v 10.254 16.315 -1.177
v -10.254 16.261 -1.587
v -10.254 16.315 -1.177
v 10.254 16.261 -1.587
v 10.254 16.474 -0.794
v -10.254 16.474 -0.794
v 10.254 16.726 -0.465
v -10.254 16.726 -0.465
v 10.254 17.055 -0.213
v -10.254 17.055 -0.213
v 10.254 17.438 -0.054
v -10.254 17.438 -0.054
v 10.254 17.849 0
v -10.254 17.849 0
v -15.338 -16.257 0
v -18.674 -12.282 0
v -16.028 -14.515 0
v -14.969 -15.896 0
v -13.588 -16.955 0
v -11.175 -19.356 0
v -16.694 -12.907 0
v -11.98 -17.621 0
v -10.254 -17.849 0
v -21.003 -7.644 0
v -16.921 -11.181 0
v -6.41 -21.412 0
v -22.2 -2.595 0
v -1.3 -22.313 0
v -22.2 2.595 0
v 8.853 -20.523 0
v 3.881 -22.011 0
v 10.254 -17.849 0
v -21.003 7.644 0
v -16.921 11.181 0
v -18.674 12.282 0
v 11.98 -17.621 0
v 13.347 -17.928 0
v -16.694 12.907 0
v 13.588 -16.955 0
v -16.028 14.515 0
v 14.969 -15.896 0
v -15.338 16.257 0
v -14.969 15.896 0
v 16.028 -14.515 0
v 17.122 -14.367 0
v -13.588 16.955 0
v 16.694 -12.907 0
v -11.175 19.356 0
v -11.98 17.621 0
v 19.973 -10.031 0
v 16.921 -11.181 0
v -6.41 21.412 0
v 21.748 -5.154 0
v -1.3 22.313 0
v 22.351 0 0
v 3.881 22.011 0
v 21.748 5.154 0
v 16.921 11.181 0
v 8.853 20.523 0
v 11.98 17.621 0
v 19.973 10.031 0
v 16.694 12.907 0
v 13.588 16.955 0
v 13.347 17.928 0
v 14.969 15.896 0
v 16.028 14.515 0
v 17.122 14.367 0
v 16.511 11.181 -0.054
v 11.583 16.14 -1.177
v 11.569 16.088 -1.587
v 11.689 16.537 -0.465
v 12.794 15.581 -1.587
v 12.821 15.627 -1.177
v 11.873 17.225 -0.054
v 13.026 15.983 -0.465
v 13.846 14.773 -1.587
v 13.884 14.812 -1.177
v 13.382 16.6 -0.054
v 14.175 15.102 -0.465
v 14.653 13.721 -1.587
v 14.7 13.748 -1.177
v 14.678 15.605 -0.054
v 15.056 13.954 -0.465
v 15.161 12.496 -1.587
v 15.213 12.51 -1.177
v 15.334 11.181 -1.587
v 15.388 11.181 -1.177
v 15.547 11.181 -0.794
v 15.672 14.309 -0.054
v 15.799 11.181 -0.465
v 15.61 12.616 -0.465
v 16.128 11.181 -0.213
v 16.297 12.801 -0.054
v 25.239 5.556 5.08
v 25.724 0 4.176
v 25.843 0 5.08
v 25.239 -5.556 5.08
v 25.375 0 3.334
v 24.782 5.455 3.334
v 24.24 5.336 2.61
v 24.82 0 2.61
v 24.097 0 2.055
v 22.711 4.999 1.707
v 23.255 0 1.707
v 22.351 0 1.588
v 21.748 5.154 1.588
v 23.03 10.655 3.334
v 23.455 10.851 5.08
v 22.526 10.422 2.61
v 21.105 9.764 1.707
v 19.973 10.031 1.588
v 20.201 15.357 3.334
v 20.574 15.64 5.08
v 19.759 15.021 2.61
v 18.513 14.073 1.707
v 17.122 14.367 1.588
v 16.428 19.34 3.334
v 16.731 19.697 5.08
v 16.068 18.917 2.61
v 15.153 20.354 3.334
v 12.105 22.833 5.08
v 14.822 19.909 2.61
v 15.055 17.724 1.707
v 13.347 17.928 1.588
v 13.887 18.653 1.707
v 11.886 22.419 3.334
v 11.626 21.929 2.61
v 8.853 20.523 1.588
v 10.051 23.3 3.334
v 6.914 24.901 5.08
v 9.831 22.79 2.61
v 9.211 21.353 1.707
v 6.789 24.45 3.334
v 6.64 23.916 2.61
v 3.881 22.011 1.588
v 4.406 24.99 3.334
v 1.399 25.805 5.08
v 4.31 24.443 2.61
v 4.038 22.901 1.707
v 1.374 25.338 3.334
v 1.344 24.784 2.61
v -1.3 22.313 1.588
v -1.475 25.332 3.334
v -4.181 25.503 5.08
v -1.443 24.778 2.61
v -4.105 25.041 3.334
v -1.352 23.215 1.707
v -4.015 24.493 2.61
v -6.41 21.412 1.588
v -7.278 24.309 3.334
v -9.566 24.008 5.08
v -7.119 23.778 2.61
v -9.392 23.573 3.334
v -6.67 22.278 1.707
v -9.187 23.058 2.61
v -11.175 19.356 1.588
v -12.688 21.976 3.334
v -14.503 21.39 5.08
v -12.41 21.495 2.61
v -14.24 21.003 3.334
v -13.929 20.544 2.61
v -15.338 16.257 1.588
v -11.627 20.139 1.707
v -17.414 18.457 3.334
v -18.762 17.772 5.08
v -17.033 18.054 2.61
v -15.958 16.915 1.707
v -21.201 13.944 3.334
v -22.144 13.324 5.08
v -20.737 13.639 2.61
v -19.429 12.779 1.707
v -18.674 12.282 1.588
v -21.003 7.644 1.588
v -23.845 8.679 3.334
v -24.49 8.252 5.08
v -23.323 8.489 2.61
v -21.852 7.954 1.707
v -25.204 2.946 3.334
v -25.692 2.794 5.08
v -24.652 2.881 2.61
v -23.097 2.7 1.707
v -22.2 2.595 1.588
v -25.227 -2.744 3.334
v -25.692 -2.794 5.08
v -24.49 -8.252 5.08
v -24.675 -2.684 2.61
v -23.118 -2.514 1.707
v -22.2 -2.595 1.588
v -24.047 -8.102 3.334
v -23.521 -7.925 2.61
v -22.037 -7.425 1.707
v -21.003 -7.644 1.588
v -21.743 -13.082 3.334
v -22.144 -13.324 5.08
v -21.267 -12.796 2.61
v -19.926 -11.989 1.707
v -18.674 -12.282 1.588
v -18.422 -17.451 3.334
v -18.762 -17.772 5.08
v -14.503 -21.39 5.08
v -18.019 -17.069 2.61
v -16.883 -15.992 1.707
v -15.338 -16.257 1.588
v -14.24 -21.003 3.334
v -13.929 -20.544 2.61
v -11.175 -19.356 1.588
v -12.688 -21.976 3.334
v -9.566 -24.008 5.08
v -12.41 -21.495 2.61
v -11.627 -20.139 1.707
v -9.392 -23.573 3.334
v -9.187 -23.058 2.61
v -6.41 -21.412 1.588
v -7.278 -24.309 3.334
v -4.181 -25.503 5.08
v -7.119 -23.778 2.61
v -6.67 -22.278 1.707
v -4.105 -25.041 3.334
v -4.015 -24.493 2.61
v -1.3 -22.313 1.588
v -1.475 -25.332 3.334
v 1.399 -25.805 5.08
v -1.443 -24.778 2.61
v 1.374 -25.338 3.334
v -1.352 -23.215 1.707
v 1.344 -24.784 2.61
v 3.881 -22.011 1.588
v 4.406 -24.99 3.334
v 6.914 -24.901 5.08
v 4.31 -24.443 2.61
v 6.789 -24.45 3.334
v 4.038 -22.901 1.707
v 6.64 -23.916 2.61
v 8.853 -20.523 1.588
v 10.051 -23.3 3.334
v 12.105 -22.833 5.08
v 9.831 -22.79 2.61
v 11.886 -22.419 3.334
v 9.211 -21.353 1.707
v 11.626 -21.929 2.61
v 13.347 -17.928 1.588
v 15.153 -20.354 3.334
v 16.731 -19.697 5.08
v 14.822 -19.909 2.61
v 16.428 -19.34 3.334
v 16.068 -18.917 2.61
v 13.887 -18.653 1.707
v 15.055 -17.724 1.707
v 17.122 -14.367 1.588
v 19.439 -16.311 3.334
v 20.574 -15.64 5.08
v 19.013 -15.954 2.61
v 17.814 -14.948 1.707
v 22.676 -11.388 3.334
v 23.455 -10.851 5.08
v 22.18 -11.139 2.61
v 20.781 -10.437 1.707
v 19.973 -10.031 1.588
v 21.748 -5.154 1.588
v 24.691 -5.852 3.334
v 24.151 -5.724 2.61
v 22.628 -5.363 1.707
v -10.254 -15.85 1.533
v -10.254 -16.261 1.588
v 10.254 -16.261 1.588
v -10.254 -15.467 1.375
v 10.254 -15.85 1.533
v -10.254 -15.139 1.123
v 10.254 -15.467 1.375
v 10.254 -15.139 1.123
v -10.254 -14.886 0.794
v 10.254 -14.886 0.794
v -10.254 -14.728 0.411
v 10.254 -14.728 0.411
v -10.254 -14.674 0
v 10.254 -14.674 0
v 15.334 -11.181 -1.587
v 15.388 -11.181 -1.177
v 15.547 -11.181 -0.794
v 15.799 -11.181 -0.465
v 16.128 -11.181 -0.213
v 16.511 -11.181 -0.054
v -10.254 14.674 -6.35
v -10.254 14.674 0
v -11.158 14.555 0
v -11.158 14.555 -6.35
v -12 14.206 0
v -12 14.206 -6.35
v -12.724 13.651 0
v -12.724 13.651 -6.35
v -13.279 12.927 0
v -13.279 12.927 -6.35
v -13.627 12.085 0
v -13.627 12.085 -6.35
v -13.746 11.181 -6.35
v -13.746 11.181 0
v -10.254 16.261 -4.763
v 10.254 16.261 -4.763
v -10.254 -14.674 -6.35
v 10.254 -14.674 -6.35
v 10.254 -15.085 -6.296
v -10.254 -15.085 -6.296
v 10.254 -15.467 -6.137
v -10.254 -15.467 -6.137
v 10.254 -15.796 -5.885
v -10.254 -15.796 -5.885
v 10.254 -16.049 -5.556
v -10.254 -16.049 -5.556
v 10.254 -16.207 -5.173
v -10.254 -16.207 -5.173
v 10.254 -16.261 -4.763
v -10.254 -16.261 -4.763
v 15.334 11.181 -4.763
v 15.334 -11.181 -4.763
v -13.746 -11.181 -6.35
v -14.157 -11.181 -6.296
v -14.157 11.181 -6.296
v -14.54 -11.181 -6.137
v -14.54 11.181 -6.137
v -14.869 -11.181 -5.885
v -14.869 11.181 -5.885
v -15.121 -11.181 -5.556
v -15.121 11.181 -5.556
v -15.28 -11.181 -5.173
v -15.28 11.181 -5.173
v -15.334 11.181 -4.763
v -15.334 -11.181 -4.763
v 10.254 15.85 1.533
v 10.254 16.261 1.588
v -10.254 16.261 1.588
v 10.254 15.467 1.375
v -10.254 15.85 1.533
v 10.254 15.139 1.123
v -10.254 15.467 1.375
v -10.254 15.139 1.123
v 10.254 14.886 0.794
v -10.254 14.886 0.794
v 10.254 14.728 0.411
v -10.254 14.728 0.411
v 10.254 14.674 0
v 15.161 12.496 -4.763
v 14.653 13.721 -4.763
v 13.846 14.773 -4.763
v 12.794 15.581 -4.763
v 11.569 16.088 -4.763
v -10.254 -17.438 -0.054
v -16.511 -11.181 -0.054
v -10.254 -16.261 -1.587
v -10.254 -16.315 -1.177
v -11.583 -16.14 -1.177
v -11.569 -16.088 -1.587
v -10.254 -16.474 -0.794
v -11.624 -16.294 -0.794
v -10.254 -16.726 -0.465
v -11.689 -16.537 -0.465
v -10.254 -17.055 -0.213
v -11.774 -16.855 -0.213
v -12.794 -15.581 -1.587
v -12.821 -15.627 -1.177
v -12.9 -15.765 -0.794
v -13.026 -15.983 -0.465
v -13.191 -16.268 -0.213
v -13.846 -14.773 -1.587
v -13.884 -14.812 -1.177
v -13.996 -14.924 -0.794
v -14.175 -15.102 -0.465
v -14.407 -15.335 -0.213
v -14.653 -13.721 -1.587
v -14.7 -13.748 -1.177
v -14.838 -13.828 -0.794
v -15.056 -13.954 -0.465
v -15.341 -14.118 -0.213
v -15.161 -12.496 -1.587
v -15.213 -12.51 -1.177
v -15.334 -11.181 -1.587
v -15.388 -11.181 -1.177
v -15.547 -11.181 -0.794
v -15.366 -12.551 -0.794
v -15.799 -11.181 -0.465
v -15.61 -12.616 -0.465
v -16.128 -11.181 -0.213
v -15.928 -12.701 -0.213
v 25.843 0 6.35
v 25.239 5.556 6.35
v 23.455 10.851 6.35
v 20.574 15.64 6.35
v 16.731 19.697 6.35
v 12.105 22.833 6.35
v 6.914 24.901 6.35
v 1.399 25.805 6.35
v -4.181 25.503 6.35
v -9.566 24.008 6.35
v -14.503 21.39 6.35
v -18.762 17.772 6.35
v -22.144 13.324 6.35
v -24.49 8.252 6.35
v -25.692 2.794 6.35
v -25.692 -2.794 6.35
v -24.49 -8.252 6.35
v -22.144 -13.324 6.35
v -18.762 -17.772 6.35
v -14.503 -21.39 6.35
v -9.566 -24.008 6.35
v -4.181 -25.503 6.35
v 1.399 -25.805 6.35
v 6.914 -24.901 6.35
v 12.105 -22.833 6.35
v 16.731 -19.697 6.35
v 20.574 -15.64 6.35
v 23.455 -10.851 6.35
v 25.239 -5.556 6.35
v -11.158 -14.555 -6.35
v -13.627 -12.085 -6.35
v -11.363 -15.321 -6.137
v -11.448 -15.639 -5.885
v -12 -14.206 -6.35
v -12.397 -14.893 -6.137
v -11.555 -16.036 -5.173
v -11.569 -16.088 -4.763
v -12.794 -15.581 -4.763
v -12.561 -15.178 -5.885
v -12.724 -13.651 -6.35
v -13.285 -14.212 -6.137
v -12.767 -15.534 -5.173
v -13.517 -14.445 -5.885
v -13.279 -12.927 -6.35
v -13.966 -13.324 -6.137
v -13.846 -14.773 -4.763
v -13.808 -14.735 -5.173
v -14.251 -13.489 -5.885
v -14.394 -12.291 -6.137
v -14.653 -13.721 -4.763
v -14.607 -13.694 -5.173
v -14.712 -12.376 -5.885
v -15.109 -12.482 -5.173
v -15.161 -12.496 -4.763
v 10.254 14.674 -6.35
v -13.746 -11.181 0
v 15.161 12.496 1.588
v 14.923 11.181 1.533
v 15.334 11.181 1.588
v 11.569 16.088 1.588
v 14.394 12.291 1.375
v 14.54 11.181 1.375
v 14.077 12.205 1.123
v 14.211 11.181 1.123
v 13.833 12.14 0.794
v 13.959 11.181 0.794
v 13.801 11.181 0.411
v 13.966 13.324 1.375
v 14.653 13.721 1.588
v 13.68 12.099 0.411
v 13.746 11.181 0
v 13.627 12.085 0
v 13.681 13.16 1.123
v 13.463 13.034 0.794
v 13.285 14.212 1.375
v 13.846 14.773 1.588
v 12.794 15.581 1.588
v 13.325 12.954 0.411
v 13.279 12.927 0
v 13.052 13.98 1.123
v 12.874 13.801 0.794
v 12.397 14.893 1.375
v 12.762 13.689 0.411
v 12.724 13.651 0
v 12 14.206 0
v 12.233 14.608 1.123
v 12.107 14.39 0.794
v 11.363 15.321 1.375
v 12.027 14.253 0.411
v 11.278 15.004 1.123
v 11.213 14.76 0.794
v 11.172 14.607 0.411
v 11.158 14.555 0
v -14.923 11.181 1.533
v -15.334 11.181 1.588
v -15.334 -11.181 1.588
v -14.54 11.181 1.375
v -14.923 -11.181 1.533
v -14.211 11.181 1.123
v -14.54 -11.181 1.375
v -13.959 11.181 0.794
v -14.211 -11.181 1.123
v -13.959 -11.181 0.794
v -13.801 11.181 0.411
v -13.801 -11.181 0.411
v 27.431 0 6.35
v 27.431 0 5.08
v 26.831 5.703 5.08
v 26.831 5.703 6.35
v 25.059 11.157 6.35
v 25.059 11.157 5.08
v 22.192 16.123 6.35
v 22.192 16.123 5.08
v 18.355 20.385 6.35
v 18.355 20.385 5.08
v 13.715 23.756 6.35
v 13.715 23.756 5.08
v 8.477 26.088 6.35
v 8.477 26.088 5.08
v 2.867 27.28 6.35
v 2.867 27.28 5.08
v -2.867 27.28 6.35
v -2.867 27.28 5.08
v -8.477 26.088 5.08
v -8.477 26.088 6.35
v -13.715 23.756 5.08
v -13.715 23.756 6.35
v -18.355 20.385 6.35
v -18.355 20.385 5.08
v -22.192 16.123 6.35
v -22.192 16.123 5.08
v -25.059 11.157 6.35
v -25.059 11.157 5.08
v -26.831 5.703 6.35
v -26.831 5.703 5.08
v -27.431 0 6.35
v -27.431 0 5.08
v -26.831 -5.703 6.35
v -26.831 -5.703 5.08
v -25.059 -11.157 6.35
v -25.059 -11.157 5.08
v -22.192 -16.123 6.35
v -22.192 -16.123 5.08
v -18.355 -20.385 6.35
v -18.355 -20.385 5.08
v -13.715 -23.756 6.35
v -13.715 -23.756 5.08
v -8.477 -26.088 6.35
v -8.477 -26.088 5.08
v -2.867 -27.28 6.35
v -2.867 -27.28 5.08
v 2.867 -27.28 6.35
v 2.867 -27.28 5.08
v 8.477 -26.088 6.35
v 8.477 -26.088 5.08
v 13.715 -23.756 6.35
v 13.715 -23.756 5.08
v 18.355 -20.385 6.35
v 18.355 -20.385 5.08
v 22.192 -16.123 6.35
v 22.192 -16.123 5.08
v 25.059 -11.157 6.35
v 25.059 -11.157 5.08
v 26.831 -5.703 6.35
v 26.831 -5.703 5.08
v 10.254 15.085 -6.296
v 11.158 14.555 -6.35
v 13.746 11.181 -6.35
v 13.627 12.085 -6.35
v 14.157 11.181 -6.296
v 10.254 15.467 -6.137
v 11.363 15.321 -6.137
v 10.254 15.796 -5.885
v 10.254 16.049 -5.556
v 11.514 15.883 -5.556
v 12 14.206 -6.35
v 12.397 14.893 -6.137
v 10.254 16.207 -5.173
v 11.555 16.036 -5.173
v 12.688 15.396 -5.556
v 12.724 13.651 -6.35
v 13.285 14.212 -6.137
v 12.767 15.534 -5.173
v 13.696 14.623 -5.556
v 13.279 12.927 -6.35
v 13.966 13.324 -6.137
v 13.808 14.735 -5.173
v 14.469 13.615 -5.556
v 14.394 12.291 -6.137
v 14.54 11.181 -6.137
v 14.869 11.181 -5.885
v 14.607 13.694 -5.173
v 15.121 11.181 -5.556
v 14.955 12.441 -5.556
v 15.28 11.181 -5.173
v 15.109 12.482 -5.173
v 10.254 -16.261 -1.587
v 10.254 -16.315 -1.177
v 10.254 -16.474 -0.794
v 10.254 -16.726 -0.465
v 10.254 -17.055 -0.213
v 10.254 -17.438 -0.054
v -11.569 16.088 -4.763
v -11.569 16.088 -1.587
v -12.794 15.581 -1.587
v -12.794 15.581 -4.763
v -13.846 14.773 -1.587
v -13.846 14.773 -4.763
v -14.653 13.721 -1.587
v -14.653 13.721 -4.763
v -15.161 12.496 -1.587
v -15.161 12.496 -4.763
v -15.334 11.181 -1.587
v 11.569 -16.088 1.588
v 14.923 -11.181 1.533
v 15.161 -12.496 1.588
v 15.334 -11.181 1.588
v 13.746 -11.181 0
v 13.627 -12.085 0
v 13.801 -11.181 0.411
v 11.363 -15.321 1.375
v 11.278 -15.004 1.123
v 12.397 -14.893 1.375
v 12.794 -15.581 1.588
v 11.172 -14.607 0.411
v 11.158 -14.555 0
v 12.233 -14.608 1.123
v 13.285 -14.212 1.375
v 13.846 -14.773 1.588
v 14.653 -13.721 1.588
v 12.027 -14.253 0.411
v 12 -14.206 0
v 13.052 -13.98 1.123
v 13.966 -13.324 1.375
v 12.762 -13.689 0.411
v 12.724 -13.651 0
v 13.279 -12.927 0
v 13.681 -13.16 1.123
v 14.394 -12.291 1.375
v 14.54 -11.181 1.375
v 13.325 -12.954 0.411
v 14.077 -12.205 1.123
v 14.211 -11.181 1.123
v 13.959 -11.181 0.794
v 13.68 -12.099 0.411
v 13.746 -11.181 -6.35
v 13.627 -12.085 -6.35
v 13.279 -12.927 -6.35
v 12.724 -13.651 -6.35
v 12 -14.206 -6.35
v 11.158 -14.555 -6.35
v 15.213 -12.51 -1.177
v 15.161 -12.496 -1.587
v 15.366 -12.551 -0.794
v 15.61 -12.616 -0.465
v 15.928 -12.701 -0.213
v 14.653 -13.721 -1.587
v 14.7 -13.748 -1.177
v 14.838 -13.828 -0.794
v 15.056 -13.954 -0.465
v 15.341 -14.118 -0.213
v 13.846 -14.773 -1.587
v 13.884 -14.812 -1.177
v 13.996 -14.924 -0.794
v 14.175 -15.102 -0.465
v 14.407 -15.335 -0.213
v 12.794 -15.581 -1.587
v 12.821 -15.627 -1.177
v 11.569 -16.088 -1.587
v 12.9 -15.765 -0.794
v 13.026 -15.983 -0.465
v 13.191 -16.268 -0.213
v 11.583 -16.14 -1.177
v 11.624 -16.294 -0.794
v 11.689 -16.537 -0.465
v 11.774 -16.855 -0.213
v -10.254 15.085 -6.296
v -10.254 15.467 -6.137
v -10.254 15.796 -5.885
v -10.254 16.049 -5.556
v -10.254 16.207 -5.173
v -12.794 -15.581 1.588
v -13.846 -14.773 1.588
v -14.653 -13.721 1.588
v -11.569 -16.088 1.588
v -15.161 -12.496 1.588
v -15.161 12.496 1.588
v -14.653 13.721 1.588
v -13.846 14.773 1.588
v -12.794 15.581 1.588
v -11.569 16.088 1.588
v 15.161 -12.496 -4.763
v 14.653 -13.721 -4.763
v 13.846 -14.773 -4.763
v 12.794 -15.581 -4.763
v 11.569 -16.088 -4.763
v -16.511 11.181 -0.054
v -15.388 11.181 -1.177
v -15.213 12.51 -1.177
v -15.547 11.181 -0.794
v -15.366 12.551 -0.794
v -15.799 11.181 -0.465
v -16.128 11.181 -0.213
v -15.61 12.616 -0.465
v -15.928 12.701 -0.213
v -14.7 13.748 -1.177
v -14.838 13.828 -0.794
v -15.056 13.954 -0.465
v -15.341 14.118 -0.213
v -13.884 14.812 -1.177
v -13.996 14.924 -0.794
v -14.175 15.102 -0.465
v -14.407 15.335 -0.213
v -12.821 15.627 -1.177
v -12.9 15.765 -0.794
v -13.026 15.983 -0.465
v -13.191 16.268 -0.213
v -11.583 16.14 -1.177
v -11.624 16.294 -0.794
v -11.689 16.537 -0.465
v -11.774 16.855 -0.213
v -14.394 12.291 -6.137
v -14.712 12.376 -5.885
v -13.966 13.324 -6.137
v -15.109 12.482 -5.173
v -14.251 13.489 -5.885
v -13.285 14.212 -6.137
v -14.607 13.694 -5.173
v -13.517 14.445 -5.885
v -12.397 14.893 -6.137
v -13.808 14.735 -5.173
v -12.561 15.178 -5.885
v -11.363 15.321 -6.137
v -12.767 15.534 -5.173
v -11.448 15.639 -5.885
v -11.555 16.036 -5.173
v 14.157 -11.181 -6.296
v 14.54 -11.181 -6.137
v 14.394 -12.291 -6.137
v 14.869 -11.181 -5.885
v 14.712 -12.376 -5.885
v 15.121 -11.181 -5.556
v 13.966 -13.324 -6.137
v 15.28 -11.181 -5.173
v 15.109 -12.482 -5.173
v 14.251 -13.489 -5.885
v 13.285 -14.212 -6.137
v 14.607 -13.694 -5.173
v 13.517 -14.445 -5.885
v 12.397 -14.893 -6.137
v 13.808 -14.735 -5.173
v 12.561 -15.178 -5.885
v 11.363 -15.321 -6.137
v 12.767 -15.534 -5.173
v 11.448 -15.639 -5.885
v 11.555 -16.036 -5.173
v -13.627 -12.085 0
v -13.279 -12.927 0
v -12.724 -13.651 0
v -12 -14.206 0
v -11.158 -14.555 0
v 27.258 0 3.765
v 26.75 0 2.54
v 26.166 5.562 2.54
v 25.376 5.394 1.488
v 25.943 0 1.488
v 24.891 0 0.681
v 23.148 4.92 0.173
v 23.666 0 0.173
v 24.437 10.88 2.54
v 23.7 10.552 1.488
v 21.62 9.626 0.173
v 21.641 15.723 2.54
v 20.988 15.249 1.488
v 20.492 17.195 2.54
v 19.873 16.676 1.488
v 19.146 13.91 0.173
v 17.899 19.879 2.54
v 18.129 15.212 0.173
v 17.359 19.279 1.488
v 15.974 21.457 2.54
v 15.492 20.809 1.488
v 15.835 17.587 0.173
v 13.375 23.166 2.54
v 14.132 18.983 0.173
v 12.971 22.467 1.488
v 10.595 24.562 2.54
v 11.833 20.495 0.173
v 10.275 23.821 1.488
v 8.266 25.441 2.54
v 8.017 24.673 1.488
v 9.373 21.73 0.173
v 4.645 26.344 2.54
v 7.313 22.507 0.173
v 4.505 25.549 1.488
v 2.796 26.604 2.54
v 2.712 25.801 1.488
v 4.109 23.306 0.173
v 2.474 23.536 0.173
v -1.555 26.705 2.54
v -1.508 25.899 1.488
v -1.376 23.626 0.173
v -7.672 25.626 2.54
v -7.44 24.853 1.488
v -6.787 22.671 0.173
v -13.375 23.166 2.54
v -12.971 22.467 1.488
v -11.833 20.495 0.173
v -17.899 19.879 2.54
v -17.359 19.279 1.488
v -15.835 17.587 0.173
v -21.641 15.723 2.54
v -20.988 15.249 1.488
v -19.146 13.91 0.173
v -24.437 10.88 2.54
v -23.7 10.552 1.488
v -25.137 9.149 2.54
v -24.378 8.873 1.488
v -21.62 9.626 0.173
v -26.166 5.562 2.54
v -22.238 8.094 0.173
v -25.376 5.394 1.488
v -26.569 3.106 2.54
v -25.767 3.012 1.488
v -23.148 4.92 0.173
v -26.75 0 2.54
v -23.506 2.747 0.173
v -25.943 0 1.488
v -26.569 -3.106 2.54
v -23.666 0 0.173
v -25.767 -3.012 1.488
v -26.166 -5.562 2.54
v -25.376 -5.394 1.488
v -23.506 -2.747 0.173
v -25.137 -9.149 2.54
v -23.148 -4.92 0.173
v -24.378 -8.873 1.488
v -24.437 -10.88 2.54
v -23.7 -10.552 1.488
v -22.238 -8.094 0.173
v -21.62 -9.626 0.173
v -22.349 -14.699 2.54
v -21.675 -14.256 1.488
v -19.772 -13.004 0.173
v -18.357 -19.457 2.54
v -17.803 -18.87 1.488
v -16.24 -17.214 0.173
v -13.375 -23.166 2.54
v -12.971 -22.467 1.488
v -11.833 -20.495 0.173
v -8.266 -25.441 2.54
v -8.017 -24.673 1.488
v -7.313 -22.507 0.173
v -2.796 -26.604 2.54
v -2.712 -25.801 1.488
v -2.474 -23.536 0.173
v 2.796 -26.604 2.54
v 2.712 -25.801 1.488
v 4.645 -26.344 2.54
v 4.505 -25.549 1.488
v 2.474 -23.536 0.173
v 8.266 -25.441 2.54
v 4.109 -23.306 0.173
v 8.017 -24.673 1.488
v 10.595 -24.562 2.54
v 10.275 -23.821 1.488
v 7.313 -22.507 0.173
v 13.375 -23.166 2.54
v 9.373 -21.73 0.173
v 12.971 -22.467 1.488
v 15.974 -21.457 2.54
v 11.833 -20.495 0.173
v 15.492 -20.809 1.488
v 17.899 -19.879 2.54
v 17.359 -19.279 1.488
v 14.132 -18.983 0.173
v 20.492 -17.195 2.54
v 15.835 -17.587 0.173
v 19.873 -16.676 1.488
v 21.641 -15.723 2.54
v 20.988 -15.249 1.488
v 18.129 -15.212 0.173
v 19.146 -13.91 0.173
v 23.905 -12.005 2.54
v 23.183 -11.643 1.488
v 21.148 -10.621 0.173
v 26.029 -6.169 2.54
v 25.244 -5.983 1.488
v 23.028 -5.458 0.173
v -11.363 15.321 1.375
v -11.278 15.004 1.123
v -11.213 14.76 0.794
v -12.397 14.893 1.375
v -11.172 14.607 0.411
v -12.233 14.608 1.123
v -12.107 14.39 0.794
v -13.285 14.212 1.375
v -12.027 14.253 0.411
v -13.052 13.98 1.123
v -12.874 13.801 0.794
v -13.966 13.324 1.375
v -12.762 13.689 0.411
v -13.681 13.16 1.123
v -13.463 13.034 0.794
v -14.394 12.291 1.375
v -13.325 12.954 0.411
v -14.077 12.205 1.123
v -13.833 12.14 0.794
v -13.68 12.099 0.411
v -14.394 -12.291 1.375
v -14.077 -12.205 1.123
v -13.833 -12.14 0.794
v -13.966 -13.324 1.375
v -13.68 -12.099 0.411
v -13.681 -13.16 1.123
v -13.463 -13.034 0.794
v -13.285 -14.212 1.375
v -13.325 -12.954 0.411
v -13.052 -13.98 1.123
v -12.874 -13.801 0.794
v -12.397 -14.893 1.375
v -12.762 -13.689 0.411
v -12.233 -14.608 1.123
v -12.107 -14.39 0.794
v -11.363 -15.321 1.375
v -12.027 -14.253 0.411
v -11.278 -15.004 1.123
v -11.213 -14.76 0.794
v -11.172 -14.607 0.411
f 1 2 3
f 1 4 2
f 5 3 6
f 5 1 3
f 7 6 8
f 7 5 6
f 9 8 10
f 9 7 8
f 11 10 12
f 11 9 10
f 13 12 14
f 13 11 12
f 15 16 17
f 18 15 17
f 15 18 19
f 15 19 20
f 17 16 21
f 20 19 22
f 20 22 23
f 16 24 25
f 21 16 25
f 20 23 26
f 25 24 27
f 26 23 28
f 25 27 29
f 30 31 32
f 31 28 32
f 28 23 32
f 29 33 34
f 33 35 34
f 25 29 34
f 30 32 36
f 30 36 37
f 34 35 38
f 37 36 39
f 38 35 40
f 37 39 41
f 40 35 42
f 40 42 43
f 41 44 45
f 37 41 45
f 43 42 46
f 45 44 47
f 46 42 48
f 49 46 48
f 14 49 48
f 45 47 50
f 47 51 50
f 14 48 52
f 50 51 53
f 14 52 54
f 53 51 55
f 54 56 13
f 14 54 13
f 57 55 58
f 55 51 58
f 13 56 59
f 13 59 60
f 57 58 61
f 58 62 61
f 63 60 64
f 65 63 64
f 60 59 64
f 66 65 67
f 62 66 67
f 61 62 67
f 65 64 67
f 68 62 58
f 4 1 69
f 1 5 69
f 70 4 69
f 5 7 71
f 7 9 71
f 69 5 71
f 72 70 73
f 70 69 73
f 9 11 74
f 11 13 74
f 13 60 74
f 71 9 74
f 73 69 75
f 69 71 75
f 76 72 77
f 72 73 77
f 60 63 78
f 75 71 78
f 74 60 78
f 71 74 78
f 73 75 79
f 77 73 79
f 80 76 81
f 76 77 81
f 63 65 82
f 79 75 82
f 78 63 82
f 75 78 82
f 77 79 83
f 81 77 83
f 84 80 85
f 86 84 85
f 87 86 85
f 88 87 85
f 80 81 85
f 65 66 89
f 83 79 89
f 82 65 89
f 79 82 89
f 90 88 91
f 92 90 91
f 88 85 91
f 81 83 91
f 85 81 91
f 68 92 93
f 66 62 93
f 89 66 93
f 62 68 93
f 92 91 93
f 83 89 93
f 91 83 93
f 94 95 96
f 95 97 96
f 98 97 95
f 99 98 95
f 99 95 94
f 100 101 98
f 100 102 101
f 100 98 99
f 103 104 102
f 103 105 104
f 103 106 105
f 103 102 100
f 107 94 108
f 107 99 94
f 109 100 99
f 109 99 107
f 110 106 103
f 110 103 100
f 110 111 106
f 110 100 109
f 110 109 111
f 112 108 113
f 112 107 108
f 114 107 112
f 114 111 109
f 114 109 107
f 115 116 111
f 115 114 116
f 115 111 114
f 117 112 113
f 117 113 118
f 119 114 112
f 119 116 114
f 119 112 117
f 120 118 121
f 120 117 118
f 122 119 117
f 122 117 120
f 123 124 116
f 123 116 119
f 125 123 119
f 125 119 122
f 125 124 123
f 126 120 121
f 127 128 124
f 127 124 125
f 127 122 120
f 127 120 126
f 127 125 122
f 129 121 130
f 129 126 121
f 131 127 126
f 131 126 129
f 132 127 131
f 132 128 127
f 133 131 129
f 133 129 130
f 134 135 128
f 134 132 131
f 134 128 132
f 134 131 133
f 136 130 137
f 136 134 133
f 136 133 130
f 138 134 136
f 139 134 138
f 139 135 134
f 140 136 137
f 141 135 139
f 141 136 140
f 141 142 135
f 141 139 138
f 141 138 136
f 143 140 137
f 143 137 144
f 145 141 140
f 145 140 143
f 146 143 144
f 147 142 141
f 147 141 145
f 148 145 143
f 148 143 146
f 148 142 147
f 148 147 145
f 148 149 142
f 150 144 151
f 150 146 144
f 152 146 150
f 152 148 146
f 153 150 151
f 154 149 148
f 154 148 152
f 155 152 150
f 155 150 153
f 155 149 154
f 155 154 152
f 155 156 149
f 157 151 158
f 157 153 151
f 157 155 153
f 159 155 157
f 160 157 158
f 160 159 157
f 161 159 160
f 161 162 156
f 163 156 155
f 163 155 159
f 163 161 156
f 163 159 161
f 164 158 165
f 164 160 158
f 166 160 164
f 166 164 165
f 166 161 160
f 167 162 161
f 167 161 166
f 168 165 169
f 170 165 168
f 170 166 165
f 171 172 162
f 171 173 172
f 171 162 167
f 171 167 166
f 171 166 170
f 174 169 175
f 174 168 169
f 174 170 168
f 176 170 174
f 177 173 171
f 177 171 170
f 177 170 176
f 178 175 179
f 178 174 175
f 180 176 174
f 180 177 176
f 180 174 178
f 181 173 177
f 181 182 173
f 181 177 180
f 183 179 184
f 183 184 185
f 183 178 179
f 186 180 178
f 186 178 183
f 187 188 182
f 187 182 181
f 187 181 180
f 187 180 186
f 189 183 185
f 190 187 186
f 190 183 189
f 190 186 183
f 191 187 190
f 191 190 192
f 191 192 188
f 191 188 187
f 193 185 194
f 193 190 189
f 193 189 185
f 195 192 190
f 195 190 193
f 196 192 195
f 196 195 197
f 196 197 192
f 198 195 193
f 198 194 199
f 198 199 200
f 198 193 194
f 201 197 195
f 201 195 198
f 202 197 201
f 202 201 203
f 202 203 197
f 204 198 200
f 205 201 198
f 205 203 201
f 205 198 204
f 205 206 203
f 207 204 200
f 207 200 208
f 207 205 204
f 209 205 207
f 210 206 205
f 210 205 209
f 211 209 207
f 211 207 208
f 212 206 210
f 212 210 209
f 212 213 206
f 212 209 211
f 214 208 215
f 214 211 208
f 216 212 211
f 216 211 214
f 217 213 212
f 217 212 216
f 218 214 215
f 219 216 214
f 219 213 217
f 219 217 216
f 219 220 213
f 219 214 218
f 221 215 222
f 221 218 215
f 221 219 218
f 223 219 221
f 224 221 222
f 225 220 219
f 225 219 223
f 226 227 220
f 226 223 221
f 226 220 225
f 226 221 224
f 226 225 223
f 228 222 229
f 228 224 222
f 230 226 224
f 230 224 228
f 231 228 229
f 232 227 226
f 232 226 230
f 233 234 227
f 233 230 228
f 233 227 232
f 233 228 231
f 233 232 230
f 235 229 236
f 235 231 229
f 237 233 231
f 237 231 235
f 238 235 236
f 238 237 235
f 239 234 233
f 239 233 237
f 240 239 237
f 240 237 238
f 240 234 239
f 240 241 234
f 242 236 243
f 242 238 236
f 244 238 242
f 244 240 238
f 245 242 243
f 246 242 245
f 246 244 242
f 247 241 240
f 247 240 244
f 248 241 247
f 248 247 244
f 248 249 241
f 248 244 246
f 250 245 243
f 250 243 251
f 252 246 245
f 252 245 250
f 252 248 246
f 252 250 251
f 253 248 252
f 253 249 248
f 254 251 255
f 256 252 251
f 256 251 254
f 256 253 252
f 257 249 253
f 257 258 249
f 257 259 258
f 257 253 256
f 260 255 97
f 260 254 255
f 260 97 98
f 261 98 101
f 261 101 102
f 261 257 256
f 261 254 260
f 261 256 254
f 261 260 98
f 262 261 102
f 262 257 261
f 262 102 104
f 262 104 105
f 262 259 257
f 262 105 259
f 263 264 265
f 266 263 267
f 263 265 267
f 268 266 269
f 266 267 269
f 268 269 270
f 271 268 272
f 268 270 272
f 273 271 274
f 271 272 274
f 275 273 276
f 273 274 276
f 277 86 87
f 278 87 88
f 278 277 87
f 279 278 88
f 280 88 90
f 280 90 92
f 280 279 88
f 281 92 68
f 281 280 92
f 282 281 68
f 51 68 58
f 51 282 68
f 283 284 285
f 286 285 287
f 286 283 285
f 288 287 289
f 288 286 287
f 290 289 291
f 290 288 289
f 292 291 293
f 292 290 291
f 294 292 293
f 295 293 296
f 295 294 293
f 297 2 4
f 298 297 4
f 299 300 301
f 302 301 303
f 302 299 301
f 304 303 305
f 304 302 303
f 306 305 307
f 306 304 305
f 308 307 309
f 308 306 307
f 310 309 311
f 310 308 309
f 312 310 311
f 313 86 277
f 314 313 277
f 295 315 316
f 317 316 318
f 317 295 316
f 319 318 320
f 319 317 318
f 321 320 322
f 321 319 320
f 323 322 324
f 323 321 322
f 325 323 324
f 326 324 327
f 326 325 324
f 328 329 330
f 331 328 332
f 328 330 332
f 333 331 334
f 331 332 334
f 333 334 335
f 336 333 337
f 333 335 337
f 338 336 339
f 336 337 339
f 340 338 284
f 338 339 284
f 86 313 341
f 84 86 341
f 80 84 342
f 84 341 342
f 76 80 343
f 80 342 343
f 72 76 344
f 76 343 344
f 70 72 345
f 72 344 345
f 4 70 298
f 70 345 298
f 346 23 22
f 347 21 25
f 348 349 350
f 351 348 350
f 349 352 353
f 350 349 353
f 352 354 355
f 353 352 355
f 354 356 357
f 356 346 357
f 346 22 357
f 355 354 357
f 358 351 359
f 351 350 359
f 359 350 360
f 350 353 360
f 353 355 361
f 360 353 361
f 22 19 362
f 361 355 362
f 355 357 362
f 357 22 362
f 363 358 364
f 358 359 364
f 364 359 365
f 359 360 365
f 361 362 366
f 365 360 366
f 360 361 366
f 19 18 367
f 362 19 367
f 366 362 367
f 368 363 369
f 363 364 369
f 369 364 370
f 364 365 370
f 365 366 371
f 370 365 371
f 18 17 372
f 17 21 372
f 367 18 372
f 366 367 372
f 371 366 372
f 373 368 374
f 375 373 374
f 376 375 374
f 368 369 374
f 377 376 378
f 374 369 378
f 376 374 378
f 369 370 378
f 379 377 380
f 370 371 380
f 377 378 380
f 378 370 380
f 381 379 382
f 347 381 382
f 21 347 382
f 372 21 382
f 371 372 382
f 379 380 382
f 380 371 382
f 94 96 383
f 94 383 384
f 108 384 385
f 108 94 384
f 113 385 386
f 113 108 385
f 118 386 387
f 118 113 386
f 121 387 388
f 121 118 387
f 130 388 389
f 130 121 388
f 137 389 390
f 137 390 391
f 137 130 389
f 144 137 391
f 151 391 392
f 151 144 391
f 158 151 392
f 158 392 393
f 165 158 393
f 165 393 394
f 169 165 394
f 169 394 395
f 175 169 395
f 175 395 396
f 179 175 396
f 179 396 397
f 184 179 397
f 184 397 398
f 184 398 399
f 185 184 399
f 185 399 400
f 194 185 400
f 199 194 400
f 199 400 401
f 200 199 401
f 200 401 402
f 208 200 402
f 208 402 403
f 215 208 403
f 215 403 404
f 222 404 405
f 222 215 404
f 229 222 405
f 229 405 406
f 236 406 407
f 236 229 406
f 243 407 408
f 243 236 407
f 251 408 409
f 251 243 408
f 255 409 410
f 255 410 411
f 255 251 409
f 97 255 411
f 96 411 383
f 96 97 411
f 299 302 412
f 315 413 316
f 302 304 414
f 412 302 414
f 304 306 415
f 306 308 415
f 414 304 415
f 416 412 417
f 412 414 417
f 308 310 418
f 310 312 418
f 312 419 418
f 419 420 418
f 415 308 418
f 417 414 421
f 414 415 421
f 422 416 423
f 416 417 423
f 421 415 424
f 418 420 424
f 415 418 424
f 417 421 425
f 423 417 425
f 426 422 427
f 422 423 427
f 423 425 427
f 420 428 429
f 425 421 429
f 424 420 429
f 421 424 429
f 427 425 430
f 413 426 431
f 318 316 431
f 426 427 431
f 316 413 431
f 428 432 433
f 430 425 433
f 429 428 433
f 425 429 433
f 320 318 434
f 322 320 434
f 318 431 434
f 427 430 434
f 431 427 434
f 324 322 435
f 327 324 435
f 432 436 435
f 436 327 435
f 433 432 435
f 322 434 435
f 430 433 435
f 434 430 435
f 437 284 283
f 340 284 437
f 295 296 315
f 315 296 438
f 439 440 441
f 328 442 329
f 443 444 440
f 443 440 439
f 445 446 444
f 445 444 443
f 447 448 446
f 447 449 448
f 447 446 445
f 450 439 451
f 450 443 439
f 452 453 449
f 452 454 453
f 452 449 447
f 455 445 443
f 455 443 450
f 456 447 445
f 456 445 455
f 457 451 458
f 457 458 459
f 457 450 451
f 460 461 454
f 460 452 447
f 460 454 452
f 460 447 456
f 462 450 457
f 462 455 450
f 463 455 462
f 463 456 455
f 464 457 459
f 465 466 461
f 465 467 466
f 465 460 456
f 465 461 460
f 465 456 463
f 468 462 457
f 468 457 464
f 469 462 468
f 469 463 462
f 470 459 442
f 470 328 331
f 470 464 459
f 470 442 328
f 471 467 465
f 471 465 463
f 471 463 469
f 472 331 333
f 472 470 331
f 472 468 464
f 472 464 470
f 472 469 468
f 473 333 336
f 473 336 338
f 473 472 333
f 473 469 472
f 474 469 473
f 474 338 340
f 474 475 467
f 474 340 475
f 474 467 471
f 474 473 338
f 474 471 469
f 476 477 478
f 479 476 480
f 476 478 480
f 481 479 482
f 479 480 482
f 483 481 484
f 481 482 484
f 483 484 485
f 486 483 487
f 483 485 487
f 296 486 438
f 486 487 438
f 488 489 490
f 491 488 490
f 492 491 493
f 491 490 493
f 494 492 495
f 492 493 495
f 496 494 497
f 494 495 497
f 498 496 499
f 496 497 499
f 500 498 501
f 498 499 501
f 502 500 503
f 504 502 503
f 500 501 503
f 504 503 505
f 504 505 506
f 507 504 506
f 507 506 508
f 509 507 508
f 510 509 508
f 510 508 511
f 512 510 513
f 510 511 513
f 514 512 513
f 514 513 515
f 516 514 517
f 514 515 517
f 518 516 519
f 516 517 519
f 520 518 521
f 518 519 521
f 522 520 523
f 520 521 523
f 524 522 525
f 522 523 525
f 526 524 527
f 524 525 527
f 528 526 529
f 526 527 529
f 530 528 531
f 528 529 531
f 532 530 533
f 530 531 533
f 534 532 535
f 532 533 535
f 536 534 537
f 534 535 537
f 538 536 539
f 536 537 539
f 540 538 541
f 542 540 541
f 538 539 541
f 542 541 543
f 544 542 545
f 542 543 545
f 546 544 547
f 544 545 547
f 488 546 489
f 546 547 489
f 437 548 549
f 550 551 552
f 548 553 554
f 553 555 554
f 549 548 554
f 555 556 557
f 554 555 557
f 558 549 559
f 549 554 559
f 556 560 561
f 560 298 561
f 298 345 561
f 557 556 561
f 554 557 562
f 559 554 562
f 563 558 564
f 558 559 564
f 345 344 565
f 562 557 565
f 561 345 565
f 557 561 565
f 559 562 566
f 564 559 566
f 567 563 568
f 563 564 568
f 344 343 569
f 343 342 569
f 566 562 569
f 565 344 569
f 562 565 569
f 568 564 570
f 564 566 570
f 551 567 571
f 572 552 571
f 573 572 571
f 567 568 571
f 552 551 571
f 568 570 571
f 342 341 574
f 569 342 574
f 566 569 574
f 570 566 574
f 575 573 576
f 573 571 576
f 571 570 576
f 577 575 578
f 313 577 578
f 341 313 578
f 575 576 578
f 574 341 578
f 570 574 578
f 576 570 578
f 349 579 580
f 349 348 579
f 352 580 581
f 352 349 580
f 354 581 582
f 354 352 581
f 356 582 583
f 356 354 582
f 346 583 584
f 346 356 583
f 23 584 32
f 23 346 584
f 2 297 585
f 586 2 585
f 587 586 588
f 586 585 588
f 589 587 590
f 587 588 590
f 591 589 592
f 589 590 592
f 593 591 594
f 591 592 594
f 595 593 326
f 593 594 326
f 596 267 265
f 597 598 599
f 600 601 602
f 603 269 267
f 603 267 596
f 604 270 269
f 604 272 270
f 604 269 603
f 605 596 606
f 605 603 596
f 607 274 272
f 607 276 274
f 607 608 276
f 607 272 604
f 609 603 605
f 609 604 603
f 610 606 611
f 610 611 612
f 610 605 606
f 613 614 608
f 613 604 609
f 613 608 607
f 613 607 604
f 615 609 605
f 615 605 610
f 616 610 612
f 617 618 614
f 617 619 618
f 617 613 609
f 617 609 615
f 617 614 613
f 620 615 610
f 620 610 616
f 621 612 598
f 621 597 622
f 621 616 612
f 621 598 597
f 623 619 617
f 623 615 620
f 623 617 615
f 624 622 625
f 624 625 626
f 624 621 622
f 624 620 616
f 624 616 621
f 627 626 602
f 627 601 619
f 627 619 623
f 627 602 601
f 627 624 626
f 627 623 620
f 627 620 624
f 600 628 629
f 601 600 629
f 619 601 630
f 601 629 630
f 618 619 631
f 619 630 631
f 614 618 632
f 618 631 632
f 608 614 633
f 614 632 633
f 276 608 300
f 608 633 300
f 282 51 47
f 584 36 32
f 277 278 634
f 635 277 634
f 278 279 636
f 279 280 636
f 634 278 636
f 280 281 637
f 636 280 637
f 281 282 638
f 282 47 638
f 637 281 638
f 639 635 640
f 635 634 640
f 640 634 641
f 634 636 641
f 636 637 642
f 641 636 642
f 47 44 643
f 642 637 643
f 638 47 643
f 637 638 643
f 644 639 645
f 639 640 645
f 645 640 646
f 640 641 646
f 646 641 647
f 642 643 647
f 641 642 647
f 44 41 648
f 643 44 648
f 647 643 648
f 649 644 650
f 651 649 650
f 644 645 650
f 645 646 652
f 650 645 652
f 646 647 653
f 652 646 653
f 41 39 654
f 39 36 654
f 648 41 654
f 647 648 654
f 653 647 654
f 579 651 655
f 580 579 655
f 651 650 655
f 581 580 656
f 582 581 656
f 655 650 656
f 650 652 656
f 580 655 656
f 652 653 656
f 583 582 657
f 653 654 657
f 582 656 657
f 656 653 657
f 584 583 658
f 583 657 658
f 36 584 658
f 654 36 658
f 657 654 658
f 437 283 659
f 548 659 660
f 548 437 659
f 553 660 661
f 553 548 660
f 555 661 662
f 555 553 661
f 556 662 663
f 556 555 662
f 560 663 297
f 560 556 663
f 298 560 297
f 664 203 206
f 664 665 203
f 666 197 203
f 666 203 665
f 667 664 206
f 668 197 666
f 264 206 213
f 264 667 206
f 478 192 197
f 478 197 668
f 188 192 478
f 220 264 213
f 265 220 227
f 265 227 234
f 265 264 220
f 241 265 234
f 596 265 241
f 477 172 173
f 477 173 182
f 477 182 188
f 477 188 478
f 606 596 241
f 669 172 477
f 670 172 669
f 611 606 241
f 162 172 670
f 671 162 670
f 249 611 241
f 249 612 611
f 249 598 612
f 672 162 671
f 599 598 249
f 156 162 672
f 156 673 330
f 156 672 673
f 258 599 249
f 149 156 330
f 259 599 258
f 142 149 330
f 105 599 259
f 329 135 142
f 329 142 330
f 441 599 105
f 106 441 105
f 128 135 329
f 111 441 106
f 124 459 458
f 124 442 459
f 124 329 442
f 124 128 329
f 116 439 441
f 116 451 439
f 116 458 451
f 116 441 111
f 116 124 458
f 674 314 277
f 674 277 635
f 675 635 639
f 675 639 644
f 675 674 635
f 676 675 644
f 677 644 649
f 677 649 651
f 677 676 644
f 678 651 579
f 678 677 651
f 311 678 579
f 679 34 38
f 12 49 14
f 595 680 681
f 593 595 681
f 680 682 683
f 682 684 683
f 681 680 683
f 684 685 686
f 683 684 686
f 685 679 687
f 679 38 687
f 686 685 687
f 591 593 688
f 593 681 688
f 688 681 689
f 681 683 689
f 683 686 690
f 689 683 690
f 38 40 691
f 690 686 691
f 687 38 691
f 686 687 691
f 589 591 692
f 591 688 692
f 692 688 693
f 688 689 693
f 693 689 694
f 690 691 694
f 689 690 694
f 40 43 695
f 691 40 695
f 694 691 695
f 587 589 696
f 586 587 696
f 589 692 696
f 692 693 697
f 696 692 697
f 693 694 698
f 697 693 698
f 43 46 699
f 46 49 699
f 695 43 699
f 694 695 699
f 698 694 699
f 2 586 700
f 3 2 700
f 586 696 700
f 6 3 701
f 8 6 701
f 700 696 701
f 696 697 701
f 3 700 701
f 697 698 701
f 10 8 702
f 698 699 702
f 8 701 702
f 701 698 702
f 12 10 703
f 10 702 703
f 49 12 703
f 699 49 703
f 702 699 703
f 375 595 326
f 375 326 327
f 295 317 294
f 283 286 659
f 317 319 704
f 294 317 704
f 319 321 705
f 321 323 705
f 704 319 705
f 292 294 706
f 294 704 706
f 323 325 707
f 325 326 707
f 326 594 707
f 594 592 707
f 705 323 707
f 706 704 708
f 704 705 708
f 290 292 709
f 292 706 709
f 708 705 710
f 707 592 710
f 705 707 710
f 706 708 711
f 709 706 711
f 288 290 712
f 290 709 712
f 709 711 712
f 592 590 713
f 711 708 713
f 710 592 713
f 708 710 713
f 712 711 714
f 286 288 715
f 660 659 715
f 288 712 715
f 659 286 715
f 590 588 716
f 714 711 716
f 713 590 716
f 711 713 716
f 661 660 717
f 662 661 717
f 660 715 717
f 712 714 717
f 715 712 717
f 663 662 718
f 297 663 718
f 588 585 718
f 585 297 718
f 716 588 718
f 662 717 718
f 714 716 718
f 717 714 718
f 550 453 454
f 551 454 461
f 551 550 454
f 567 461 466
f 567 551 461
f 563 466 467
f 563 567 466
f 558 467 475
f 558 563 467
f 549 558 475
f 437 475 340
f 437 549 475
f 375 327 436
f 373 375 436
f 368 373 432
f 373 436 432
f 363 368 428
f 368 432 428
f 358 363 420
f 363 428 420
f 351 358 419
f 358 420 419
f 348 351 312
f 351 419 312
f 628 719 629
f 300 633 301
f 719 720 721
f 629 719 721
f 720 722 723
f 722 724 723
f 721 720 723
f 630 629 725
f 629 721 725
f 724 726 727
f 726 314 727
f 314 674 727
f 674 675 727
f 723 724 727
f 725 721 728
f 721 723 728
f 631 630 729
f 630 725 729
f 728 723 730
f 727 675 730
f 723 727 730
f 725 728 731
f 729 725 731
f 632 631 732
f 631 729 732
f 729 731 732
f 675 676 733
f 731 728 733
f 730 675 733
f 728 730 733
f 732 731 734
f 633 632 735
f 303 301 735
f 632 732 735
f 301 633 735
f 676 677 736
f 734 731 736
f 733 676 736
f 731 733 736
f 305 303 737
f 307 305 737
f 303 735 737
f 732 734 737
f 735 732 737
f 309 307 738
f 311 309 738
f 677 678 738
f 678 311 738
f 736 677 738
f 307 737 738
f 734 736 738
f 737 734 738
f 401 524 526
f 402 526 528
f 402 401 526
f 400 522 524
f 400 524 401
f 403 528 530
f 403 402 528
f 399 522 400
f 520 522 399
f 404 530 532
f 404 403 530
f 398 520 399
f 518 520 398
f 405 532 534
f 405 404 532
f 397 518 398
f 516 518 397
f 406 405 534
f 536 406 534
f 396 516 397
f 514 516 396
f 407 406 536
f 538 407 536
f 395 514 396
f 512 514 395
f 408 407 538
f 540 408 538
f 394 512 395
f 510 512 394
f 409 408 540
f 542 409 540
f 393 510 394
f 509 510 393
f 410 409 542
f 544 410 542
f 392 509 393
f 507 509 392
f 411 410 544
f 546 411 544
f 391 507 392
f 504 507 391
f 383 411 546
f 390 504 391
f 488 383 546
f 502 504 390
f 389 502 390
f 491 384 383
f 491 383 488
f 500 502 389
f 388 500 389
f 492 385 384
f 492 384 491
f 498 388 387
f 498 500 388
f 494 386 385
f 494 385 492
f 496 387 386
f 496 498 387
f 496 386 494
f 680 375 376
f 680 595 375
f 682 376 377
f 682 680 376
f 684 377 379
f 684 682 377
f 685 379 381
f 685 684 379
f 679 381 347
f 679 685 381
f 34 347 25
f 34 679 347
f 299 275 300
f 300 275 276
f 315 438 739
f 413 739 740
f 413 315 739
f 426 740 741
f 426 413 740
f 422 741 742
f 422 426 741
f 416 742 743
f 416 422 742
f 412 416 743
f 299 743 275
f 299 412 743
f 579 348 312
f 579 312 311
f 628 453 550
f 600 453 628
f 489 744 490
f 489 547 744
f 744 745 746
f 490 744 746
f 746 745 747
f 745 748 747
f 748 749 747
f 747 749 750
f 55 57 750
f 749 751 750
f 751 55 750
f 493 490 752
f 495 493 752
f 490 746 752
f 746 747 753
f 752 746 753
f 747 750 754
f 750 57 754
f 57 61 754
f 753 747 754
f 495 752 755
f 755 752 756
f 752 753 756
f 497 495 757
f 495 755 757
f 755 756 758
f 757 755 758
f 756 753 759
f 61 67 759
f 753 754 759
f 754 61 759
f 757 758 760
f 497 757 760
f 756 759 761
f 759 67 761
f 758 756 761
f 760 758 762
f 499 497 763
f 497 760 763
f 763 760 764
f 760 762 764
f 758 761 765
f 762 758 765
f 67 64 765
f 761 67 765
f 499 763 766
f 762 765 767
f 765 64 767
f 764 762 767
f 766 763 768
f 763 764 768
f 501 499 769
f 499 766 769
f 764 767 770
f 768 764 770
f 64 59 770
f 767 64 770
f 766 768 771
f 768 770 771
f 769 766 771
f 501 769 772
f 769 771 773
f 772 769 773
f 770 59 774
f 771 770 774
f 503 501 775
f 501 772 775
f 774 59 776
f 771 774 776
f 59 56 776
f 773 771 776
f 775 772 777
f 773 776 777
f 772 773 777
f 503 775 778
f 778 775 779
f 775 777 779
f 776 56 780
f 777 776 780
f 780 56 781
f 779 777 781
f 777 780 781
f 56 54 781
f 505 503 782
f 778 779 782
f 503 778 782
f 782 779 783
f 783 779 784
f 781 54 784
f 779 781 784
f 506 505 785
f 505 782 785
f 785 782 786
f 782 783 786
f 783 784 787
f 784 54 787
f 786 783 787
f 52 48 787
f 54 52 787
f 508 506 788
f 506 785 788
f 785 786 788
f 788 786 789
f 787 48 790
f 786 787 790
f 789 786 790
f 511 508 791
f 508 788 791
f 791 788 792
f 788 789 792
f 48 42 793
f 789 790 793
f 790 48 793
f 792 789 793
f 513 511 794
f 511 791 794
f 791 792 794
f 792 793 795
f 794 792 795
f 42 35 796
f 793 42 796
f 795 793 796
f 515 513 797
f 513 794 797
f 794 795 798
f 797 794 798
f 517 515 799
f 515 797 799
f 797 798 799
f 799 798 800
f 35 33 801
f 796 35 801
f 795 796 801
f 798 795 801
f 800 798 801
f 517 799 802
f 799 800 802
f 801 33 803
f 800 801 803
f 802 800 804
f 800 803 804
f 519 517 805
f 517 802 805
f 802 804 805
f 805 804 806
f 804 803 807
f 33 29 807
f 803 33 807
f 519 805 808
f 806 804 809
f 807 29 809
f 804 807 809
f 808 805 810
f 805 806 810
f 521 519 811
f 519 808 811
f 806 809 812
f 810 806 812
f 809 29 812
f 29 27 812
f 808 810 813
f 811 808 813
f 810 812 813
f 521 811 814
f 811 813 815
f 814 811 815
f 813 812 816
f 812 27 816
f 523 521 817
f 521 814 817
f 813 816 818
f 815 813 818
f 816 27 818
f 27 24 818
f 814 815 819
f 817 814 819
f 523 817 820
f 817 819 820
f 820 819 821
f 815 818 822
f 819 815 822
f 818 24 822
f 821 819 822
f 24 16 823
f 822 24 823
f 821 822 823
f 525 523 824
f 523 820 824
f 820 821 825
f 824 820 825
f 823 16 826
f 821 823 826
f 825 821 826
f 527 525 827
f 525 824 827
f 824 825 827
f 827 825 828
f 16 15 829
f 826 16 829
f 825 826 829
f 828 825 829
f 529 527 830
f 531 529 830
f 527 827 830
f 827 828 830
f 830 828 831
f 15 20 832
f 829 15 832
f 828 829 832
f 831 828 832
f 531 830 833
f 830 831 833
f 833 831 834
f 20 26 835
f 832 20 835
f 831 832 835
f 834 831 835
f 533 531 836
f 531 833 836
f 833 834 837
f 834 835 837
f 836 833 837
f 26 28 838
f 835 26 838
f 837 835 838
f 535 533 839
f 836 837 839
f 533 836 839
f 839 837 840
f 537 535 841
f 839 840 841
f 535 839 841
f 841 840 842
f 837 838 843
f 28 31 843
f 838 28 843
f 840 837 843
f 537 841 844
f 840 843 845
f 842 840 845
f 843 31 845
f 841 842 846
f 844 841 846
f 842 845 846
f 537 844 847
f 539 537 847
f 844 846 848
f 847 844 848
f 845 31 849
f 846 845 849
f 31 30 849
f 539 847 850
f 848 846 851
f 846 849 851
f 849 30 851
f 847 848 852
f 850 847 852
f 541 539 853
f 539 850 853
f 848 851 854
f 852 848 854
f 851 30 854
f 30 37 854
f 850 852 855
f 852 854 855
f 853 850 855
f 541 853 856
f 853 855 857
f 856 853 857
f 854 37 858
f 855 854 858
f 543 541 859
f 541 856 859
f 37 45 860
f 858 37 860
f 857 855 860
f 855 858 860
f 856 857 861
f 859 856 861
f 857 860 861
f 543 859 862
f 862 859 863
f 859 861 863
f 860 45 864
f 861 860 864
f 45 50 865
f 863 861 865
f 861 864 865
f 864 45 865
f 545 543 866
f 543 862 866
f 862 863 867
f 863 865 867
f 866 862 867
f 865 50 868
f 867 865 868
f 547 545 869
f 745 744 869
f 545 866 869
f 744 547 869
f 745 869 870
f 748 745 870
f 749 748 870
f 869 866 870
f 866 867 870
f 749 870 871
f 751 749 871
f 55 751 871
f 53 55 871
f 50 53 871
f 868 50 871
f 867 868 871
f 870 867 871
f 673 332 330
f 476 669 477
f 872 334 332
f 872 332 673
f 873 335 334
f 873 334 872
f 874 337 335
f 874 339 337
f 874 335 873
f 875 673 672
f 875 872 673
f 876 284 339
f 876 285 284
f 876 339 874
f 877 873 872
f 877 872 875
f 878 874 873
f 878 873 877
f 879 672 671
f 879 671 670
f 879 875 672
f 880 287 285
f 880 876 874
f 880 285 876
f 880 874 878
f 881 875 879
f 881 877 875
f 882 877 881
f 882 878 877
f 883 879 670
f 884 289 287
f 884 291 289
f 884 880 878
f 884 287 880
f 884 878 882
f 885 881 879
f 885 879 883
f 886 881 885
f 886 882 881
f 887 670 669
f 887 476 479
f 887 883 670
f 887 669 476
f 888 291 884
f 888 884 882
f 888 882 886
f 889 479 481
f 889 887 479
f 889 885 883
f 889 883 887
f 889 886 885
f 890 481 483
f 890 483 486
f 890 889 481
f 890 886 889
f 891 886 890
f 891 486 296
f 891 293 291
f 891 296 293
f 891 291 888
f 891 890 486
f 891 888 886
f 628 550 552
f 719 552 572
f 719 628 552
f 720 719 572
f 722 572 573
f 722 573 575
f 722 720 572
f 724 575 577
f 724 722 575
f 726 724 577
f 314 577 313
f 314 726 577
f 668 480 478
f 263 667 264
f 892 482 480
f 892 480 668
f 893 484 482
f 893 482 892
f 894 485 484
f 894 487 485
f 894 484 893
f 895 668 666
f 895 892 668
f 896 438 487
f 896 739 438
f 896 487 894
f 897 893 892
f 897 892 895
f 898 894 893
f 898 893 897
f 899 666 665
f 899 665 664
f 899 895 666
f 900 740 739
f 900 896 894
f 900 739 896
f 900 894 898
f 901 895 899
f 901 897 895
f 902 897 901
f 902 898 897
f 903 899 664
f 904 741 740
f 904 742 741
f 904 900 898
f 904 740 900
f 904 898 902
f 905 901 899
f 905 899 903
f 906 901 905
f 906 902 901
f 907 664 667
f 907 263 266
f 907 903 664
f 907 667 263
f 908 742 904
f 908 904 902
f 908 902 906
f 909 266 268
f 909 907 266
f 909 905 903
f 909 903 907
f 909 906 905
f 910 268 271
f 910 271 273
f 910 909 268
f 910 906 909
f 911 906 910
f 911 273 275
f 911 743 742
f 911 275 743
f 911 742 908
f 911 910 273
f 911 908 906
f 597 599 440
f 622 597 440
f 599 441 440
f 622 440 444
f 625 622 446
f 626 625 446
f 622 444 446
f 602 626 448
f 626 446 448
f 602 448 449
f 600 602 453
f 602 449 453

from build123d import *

# Parameters (mm, degrees)
F0_R     = 27.4307553129
F1_DEPTH = 6.35
F9_R     = 5.08
F2_T     = -1.5875
F3_W     = 30.6679024691
F3_H     = 32.5223739966
F4_DEPTH = 6.35
F5_R     = 5.08
F6_T     = -1.5875
F7_DEPTH = 6.351
F10_R    = 1.5875
F11_R    = 1.58749


# Not quite as in the source:
# - a fillet or chamfer is up to 0.001 mm smaller than in the source, because OpenCascade refuses the exact size


with BuildPart() as f1:
    # F0 (on Top) → F1 (new body)
    with BuildSketch(Plane.XY):
        Circle(F0_R)
    extrude(amount=F1_DEPTH)

    # F9
    f9_edges = [f1.edges().sort_by_distance(p)[0] for p in [
        (-27.430755, 0, 0),
    ]]
    fillet(f9_edges, radius=F9_R)

    # F2
    f2_openings = [f1.faces().sort_by_distance(p)[0] for p in [
        (0, 0, 6.35),
    ]]
    offset(amount=F2_T, openings=f2_openings)

    # F3 (on face) → F4 (join)
    with BuildSketch(Plane(origin=(0, 0, 0), x_dir=(1, 0, 0), z_dir=(0, 0, -1))):
        Rectangle(F3_W, F3_H)
    extrude(amount=F4_DEPTH)

    # F5
    f5_edges = [f1.edges().sort_by_distance(p)[0] for p in [
        (-15.333951, 16.261187, -3.175),
        (-15.333951, -16.261187, -3.175),
        (15.333951, -16.261187, -3.175),
        (15.333951, 16.261187, -3.175),
    ]]
    fillet(f5_edges, radius=F5_R)

    # F6
    f6_openings = [f1.faces().sort_by_distance(p)[0] for p in [
        (0, 0, -6.35),
    ]]
    offset(amount=F6_T, openings=f6_openings, kind=Kind.INTERSECTION)

    # F7 (cut, through all): a face of the model
    f7_faces = [f1.faces().sort_by_distance(p)[0] for p in [
        (0, 0, 0),
    ]]
    extrude(f7_faces, amount=-F7_DEPTH, mode=Mode.SUBTRACT)

    # F10
    f10_edges = [f1.edges().sort_by_distance(p)[0] for p in [
        (13.746451, 0, 1.5875),
    ]]
    fillet(f10_edges, radius=F10_R)

    # F11 (radius 1.5875 in the source; OpenCascade refuses exactly that, so slightly less here)
    f11_edges = [f1.edges().sort_by_distance(p)[0] for p in [
        (15.333951, 0, 0),
        (15.333951, 11.181187, -3.175),
        (15.333951, -11.181187, -3.175),
        (15.333951, 0, -6.35),
    ]]
    fillet(f11_edges, radius=F11_R)


solid = f1.part
